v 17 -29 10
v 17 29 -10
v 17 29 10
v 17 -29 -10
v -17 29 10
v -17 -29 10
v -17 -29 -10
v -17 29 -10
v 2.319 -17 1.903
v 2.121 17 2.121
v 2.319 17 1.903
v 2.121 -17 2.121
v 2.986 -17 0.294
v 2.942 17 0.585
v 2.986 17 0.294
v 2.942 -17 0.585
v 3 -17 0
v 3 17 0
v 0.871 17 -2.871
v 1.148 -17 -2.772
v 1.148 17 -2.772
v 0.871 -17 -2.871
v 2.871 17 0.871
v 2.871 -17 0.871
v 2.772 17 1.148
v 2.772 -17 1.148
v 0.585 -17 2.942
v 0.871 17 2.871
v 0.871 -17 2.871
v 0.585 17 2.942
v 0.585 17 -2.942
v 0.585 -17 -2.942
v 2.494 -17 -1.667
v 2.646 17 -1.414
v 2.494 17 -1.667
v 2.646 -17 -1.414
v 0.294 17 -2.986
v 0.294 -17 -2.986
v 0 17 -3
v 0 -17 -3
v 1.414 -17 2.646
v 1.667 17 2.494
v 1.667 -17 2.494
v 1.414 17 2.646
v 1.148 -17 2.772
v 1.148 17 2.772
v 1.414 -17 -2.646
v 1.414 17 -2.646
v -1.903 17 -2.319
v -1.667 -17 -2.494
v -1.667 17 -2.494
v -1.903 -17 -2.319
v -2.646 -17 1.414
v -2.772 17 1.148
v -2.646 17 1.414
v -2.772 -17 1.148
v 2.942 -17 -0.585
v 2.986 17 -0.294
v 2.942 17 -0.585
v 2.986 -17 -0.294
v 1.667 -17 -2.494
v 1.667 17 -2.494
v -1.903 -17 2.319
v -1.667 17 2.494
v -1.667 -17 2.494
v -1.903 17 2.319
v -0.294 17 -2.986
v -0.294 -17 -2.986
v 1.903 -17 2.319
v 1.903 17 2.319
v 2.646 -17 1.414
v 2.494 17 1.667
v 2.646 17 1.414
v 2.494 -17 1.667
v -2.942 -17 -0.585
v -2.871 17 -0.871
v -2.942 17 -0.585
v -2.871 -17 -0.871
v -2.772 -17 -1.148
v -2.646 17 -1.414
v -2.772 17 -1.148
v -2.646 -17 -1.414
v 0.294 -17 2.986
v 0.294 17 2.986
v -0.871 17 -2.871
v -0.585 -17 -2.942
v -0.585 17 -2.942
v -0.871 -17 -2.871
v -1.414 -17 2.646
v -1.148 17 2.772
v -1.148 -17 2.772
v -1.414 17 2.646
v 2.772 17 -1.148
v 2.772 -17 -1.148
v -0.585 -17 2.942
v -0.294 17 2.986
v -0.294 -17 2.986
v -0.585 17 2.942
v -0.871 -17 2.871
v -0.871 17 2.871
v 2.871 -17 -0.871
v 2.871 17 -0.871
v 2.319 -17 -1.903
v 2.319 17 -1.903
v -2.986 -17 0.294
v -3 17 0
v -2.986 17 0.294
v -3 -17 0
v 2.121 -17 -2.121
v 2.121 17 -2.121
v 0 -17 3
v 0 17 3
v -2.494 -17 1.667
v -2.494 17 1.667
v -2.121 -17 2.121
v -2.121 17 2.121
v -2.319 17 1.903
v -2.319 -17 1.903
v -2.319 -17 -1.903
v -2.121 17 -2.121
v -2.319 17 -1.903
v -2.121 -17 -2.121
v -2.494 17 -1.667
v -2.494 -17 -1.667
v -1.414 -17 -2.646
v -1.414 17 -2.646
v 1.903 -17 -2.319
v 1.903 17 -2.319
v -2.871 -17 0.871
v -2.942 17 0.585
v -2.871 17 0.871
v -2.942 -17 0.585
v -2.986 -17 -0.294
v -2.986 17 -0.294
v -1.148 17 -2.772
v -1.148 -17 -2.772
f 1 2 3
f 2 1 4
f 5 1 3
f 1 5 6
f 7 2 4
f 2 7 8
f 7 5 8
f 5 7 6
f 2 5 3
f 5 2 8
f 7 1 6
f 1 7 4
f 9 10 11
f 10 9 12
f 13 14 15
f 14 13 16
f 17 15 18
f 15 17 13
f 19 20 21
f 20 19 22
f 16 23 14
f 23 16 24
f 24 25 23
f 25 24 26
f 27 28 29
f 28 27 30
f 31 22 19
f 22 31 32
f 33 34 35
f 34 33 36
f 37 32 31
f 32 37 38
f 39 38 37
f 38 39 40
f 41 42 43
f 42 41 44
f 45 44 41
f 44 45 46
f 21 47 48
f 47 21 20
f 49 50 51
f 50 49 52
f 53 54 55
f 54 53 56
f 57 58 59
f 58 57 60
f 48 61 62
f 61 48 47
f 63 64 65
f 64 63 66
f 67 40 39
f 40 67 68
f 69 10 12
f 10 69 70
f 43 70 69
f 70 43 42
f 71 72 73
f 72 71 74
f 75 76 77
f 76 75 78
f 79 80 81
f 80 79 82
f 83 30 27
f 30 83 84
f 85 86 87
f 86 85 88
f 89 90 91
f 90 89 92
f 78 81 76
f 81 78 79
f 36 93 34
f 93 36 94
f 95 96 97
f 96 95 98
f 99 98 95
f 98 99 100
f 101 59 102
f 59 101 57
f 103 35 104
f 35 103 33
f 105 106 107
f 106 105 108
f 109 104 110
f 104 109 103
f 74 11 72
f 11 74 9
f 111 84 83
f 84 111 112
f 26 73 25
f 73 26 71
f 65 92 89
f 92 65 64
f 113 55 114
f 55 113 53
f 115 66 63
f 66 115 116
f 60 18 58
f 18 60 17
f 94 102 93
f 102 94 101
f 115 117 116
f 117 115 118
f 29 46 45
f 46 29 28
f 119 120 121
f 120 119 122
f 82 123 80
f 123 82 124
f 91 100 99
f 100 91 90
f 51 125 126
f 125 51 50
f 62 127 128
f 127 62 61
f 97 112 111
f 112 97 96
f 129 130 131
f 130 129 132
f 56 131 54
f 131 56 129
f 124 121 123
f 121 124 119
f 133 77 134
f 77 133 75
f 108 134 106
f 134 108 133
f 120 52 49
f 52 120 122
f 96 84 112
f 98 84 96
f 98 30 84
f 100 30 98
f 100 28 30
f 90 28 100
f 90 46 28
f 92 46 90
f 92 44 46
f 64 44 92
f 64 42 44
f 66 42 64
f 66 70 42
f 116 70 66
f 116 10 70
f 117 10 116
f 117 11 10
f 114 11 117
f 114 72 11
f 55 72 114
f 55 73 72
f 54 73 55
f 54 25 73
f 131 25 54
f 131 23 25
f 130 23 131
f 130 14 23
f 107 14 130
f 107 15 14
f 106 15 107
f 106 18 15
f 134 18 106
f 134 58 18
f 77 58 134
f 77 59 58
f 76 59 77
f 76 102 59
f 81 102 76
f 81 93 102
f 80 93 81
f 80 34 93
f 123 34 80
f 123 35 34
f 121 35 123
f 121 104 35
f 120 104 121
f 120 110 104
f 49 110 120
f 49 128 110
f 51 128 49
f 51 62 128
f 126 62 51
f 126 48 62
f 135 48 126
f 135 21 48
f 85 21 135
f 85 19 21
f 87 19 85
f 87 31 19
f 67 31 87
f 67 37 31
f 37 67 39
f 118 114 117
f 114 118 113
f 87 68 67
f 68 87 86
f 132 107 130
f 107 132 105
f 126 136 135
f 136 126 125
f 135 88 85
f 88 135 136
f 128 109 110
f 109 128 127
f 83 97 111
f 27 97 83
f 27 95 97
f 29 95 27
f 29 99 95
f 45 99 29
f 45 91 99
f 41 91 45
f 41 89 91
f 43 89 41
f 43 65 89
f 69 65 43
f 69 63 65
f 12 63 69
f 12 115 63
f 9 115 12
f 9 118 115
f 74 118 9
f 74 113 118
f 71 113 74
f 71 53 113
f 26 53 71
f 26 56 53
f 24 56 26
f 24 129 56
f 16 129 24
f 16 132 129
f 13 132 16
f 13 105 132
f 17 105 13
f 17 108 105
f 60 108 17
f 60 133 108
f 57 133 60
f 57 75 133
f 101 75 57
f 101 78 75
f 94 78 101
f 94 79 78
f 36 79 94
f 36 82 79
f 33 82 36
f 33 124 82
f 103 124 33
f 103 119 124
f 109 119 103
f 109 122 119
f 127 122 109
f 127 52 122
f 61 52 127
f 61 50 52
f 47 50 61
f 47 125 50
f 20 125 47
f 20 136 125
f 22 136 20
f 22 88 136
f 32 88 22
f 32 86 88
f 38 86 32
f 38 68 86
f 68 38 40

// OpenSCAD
module linear_bearing_block() {
    difference() {
        // Main block
        cube([34, 58, 20], center = true);
        
        // Shaft hole
        translate([0, 0, 0])
            rotate([90, 0, 0])
            cylinder(h = 34, d = 6, center = true, $fn = 64);
    }
}

linear_bearing_block();
